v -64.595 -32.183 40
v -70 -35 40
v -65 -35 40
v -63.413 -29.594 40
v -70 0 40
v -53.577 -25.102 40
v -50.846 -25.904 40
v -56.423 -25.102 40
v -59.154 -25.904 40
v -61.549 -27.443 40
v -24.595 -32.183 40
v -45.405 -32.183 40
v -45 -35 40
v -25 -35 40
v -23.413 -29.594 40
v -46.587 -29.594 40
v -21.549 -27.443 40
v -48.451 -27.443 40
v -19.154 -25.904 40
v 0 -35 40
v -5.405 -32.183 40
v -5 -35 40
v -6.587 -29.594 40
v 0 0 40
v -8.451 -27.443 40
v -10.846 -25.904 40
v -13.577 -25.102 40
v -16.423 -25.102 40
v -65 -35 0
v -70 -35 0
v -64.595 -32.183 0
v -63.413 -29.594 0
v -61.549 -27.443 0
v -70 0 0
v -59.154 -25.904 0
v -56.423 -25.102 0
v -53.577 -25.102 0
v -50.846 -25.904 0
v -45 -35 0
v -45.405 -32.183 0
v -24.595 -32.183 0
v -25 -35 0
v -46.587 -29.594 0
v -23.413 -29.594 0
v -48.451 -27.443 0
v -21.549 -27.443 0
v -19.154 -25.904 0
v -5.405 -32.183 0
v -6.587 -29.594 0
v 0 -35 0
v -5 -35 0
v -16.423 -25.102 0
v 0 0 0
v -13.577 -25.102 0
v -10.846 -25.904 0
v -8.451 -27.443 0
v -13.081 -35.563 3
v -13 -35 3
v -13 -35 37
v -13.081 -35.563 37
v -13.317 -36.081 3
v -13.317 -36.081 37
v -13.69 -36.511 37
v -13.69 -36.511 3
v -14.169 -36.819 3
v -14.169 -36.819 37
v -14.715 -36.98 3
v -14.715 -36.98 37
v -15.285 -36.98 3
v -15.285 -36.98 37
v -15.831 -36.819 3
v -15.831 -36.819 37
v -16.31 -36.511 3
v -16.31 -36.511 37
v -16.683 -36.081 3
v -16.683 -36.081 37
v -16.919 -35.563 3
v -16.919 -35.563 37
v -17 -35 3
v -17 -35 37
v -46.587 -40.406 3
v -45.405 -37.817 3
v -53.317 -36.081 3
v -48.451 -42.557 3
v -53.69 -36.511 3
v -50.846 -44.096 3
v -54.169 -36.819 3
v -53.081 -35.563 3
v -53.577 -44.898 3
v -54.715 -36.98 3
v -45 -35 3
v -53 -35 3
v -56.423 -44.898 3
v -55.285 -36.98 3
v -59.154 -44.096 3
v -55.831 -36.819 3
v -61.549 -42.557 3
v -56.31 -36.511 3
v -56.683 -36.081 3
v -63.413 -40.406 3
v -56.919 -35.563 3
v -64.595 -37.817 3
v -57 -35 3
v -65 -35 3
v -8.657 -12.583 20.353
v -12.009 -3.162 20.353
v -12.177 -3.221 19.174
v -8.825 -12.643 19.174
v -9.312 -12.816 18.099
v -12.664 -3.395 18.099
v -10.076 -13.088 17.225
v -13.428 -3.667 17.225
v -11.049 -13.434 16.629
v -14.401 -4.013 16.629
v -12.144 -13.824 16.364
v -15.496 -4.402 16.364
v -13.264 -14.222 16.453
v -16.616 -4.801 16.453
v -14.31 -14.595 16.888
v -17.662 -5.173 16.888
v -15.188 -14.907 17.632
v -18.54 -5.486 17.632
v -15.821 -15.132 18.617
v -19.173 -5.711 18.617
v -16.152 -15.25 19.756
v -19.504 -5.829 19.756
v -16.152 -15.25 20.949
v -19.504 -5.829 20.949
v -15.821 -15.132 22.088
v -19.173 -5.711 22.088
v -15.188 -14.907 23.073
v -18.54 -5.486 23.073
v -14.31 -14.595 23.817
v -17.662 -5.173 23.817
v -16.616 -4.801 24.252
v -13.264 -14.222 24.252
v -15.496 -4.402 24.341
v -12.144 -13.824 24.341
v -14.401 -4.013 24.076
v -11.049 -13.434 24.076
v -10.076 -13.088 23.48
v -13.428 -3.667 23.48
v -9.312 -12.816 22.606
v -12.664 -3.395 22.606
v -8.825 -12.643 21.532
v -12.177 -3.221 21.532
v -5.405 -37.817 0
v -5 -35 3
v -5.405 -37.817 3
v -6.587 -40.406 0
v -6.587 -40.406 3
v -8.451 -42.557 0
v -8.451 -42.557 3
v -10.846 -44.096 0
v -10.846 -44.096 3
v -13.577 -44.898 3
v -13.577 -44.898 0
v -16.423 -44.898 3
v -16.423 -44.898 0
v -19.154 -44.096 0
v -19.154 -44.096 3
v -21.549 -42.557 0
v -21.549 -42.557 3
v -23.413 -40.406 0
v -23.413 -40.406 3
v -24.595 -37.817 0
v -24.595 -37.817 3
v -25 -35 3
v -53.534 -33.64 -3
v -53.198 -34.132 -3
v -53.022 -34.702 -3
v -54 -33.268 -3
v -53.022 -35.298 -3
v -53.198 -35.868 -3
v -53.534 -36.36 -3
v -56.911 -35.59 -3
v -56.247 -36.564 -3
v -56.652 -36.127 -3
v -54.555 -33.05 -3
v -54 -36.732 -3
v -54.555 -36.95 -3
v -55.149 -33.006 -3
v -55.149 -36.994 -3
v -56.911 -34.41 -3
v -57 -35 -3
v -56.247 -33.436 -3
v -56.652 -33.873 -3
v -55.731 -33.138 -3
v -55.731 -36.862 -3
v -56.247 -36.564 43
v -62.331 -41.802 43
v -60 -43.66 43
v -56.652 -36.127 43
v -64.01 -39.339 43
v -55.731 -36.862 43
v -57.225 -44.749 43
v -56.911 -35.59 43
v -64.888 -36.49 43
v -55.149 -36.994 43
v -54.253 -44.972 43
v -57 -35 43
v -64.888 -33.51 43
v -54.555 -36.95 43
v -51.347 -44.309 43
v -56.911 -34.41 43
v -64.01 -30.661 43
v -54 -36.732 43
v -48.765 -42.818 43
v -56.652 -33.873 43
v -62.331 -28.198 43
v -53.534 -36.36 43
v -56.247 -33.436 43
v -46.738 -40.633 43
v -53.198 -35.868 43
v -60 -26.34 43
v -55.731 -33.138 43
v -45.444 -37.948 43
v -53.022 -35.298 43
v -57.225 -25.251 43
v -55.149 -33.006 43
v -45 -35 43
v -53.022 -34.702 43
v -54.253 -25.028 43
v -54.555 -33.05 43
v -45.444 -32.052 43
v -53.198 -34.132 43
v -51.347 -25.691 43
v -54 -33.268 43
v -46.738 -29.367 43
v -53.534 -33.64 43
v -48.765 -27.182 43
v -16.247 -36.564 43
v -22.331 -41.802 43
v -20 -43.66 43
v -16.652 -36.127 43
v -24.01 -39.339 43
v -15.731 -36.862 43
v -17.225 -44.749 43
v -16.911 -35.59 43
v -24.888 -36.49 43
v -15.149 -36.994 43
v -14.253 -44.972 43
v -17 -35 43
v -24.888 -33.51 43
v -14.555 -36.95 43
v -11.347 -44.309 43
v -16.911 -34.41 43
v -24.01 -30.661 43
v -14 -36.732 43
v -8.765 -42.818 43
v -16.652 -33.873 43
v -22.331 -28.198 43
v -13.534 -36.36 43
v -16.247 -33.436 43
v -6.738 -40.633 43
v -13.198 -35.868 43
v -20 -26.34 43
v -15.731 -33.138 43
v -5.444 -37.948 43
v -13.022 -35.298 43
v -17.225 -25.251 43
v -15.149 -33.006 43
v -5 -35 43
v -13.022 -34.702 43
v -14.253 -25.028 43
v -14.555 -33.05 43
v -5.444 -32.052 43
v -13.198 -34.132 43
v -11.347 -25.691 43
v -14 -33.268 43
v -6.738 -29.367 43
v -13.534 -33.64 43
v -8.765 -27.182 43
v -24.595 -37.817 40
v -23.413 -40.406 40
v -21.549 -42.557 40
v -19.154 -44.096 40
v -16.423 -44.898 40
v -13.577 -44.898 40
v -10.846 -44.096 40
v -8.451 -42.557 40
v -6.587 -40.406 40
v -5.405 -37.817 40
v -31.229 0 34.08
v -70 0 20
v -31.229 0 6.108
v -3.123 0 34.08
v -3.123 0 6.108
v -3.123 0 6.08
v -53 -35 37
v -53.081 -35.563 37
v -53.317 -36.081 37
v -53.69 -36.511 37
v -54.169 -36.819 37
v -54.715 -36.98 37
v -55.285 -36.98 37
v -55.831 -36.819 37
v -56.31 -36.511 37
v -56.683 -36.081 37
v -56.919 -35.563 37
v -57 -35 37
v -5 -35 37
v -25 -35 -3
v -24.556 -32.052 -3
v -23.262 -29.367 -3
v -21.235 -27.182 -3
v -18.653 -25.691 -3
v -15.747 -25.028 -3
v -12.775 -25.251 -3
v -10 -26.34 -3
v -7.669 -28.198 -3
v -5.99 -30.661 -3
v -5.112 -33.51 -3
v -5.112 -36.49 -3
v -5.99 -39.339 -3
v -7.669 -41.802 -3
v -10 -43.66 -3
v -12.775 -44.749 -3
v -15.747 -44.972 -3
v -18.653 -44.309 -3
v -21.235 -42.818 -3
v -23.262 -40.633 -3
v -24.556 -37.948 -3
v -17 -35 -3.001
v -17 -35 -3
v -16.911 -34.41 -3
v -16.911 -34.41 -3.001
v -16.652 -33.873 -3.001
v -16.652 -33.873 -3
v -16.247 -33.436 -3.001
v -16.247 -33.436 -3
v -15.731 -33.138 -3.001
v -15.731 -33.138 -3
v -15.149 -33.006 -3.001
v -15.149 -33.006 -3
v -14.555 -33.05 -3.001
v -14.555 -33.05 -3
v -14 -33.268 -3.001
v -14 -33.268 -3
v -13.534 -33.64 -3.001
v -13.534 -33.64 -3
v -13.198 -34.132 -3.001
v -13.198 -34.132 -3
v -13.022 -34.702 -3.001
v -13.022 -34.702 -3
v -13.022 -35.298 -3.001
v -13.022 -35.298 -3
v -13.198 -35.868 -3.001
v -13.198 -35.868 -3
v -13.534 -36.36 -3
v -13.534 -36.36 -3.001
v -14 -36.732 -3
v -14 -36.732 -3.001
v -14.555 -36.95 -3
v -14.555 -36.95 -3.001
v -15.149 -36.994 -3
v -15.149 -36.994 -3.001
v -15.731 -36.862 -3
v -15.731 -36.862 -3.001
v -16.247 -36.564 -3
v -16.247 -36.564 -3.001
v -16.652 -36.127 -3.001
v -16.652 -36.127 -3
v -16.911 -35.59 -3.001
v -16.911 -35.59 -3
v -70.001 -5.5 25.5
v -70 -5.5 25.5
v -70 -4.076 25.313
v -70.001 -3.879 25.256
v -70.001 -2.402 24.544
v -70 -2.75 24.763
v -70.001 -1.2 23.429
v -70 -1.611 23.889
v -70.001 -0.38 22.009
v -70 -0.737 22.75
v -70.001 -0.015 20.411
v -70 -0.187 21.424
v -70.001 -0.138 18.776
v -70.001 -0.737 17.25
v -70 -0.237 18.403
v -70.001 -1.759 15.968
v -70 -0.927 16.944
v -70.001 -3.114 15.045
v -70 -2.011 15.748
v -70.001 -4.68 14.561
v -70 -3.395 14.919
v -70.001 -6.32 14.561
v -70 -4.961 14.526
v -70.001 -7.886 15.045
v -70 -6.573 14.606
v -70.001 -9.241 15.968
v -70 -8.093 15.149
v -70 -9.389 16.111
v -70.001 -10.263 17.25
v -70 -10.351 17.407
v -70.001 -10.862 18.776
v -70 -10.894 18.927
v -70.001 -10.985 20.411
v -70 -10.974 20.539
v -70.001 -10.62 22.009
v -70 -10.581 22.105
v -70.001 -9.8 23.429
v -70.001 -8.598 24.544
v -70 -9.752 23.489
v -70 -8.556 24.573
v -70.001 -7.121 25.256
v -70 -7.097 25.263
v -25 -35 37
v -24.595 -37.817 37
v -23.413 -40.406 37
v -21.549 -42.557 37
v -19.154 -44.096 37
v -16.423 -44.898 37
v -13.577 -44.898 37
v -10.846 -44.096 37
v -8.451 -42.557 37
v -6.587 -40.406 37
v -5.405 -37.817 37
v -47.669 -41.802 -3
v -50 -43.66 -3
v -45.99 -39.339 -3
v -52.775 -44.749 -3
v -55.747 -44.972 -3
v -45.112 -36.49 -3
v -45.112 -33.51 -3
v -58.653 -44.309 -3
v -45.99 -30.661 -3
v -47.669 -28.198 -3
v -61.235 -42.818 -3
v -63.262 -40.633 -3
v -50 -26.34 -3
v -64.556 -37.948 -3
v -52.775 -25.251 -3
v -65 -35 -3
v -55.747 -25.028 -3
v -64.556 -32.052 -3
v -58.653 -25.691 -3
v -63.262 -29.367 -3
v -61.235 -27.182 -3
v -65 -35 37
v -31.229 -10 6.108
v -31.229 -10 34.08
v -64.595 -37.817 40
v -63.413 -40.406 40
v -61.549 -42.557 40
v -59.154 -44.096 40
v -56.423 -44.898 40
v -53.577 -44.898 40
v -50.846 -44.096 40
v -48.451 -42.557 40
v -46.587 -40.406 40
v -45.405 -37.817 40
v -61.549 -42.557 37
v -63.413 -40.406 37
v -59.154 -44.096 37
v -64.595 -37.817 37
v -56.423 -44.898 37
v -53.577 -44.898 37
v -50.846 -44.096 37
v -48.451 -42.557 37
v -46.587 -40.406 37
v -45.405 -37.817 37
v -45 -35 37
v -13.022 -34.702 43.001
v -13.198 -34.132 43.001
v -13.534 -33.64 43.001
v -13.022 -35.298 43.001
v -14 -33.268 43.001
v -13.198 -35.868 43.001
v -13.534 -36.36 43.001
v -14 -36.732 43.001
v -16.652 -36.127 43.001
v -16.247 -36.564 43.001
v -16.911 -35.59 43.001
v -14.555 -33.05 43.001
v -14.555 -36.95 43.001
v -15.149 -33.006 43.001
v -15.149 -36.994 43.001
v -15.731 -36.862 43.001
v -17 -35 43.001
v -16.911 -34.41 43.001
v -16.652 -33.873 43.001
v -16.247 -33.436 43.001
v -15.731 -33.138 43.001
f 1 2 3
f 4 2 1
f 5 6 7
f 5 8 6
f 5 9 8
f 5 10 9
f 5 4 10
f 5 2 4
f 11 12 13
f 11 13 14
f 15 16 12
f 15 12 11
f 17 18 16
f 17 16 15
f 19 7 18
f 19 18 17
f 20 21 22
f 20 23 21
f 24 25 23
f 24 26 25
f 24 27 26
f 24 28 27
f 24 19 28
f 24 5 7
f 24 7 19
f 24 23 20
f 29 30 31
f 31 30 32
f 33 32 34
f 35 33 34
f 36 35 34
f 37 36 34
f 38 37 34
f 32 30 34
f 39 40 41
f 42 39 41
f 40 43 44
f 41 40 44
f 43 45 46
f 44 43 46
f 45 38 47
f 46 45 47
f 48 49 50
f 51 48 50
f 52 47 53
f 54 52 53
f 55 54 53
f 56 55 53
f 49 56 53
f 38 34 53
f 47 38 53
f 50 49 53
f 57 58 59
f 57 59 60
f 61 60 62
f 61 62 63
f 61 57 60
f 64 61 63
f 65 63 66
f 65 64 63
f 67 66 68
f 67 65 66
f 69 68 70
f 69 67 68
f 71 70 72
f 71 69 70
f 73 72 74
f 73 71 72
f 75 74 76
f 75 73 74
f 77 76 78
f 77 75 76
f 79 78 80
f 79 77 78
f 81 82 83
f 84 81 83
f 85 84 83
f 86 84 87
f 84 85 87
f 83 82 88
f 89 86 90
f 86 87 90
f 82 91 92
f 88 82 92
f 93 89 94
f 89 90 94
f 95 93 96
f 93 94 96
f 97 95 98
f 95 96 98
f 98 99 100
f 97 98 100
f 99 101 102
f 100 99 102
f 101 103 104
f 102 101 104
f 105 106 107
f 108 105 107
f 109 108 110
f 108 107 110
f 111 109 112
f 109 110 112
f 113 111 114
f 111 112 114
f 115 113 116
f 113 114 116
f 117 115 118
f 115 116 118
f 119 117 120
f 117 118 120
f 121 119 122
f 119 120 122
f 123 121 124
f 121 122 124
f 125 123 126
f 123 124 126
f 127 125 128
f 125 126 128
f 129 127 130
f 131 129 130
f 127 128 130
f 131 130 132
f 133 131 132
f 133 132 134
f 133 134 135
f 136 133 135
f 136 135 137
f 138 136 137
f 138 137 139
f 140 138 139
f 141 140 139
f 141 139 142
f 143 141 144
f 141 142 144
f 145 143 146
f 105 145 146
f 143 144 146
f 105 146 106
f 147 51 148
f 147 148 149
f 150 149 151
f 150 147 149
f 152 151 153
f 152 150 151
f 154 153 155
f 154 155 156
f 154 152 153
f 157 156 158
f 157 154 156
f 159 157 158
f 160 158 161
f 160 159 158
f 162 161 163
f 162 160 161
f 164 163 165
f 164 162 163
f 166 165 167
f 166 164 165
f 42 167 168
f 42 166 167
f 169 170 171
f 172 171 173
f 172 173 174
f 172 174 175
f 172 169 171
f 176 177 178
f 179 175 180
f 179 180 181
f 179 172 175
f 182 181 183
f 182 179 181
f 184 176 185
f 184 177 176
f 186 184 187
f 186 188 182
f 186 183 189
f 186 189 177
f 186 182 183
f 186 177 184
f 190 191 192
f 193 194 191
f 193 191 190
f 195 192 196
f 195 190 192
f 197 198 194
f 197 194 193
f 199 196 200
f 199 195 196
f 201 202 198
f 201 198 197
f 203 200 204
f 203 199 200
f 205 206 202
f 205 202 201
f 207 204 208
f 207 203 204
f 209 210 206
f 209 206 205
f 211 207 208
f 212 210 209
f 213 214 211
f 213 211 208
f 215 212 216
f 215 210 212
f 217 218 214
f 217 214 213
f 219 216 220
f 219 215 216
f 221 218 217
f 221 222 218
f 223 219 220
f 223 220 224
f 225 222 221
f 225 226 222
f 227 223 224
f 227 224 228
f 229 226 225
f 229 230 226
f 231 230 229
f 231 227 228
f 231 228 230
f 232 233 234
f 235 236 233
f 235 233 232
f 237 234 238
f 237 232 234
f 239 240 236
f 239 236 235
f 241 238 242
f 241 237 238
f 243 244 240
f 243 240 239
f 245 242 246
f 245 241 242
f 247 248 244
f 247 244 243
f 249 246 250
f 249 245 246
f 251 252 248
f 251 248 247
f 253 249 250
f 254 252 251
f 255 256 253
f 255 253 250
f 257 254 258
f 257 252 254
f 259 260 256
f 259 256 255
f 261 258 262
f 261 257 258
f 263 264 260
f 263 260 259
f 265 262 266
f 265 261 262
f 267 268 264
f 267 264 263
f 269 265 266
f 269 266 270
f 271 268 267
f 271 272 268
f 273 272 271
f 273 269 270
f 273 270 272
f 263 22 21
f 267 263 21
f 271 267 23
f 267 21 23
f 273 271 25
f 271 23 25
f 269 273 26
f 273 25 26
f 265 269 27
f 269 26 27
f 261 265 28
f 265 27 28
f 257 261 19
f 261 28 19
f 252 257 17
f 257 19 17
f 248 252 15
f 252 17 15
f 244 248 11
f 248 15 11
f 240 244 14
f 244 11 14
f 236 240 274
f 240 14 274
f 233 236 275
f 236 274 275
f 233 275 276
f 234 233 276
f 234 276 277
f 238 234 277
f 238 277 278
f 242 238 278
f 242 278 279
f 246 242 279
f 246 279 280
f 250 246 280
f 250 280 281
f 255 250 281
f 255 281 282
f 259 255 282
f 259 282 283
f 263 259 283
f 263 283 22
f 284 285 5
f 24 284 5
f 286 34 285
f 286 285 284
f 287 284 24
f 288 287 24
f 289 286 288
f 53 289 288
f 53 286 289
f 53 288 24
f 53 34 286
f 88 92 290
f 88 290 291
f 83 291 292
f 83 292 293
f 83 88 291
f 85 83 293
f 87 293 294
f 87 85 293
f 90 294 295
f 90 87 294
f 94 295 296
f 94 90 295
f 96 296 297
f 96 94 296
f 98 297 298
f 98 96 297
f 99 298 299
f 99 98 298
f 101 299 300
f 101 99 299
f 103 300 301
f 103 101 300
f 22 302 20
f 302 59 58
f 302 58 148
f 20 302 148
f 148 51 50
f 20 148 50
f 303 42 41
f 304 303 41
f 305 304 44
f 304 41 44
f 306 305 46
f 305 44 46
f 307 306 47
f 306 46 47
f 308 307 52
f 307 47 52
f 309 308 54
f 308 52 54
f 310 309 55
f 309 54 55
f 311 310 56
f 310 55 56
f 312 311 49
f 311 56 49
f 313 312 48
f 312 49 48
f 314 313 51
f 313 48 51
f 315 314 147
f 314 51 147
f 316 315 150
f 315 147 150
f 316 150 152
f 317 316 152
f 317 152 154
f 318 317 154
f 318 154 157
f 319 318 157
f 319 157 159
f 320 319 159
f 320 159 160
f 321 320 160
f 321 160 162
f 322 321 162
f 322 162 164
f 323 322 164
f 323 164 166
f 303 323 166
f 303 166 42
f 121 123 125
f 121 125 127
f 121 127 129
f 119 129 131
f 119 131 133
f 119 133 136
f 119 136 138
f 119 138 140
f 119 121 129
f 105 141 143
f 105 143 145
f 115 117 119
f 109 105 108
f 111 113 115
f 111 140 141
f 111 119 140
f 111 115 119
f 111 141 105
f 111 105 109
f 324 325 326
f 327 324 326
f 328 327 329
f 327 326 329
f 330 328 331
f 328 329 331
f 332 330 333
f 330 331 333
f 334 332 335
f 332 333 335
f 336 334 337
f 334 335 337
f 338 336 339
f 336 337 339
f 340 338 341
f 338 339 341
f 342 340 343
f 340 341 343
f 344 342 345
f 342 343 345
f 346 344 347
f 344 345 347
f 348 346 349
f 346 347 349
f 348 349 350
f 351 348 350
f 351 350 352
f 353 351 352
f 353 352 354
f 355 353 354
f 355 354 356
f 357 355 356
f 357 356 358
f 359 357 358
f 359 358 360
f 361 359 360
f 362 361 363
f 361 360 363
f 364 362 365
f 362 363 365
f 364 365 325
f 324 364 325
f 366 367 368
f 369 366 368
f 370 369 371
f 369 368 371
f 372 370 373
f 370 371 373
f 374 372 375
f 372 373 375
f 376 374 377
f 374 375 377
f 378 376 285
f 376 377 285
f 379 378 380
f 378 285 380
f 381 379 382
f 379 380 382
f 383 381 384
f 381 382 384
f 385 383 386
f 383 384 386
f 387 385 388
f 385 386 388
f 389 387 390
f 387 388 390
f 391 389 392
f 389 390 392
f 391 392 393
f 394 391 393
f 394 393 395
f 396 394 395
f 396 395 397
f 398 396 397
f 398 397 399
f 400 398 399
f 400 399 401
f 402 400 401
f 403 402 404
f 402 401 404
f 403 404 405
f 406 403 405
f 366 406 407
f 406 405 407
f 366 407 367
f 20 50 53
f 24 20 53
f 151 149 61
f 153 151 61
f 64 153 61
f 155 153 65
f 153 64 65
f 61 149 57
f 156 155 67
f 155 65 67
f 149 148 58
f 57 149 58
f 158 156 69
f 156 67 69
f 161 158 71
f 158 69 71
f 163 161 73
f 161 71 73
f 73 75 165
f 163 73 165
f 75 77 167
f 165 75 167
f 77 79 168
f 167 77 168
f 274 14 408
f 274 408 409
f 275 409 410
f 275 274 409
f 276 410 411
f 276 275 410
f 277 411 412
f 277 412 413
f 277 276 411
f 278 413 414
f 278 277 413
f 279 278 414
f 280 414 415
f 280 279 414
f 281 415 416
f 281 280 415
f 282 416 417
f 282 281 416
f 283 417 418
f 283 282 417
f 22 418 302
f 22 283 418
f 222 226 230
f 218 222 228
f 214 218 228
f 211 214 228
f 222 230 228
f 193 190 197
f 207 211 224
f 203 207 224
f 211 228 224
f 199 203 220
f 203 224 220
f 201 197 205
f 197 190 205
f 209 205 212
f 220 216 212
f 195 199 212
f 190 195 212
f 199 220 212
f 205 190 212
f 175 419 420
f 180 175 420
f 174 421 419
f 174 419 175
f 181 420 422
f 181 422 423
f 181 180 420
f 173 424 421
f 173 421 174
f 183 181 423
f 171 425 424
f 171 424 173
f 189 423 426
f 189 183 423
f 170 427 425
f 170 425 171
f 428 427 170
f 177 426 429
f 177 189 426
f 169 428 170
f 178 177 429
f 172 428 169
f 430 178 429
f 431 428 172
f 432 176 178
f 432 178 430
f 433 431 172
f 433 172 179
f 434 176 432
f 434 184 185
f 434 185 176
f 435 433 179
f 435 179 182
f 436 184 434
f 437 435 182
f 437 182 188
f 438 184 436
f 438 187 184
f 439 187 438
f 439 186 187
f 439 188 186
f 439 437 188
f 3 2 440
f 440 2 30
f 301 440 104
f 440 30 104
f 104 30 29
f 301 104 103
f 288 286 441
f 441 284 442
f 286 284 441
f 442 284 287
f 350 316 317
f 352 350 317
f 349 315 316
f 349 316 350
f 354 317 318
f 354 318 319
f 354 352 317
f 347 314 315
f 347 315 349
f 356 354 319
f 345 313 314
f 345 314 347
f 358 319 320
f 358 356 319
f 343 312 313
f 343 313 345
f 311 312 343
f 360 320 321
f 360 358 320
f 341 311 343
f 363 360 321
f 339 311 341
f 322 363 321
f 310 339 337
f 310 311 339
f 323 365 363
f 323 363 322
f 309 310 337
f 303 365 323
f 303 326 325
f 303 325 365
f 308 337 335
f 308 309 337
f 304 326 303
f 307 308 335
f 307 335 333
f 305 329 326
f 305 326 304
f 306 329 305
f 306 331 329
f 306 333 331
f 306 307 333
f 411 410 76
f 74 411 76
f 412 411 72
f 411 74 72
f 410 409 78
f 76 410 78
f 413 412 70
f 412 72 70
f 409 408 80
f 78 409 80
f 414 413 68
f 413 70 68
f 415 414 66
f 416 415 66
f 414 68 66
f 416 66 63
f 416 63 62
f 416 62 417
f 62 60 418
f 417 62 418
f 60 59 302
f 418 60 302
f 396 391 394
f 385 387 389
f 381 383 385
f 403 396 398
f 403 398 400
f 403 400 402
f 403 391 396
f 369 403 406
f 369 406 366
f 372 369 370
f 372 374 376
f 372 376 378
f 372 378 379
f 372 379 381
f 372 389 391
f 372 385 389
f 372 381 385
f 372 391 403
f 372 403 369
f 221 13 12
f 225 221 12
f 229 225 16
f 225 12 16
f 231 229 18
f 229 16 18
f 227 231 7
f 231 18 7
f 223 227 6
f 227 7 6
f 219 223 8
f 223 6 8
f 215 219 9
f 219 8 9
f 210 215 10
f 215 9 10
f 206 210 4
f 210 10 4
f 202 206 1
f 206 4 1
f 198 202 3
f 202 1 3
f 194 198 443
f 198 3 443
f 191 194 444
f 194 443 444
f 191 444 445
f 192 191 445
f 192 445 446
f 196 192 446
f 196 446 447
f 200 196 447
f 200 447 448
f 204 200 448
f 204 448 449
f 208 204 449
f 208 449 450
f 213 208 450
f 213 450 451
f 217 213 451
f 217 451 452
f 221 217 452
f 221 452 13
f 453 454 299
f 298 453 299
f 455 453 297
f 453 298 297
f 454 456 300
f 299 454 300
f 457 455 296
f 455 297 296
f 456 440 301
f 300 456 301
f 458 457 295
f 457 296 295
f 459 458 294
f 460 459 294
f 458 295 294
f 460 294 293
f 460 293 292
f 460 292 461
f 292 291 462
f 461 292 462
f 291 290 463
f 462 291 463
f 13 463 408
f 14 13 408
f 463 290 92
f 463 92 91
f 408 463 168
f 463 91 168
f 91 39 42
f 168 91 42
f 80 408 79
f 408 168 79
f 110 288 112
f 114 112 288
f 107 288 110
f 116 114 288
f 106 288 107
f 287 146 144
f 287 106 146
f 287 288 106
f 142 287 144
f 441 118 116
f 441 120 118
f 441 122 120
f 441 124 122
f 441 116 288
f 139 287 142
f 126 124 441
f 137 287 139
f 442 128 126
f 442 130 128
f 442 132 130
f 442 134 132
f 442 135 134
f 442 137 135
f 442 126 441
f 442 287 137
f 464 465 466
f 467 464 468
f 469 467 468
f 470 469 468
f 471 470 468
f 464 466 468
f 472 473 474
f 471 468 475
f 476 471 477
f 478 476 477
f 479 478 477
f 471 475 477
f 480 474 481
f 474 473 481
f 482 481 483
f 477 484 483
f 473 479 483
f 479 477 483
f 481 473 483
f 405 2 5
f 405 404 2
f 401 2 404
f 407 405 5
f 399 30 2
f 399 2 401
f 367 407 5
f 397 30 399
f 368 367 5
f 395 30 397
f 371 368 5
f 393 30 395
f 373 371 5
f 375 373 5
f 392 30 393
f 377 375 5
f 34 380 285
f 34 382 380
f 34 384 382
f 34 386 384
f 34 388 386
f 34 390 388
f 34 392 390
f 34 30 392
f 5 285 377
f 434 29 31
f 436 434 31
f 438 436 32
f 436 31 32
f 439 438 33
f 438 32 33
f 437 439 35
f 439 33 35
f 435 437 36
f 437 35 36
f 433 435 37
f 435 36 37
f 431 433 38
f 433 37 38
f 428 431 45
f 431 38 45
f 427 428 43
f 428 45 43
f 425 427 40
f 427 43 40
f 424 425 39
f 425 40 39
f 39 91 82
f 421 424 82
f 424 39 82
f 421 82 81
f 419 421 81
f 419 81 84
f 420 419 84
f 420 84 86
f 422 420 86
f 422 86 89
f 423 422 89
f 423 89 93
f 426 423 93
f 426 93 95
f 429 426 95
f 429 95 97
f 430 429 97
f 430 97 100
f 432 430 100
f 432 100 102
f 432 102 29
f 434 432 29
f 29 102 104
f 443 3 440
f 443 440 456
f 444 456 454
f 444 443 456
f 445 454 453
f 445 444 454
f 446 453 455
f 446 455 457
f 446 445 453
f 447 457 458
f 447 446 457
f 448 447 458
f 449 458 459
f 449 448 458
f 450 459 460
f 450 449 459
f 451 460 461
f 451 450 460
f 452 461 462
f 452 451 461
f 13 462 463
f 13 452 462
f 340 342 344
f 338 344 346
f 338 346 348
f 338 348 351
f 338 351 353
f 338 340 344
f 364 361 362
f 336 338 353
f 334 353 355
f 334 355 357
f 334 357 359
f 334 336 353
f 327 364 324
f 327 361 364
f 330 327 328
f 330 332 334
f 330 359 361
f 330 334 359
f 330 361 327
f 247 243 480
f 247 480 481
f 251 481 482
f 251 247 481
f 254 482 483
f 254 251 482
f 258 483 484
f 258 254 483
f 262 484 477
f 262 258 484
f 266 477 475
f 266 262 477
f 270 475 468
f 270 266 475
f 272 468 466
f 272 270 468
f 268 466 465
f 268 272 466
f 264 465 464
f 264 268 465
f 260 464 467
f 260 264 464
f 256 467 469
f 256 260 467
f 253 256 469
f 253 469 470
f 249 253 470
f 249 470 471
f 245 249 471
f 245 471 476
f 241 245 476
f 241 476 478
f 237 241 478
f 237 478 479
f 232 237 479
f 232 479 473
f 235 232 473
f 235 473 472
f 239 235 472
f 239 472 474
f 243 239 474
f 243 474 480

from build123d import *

# Parameters (mm, degrees)
SKETCH2_W                 = 70
SKETCH2_H                 = 35
BOSS_EXTRUDE2_DEPTH       = 40
SKETCH3_W                 = 28.105894453
SKETCH3_H                 = 27.971945797
CUT_EXTRUDE1_DEPTH        = 10
SKETCH4_R                 = 10
CUT_EXTRUDE2_DEPTH        = 3
SKETCH5_R                 = 10
CUT_EXTRUDE3_DEPTH        = 3
SKETCH6_R                 = 10
BOSS_EXTRUDE3_DEPTH       = 3
BOSS_EXTRUDE3_DEPTH_BACK  = 3
SKETCH7_R                 = 10
BOSS_EXTRUDE5_DEPTH       = 6
SKETCH8_R                 = 2
CUT_EXTRUDE5_DEPTH        = 46
SKETCH9_R                 = 2
BOSS_EXTRUDE8_DEPTH       = 0.0001
BOSS_EXTRUDE8_DEPTH_BACK  = 46.0001
SKETCH10_R                = 10
BOSS_EXTRUDE9_DEPTH       = 3
BOSS_EXTRUDE9_DEPTH_BACK  = 3
SKETCH11_R                = 10
BOSS_EXTRUDE10_DEPTH      = 3
BOSS_EXTRUDE10_DEPTH_BACK = 3
SKETCH12_R                = 2
CUT_EXTRUDE6_DEPTH        = 46
SKETCH13_R                = 2
BOSS_EXTRUDE11_DEPTH      = 0.001
BOSS_EXTRUDE11_DEPTH_BACK = 46.001
BOSS_EXTRUDE12_DEPTH      = 28
SKETCH18_R                = 4
CUT_EXTRUDE11_DEPTH       = 10
SKETCH19_R                = 5.5
BOSS_EXTRUDE13_DEPTH      = 0.001


with BuildPart() as part:
    # Sketch2 → Boss-Extrude2 (new body)
    with BuildSketch(Plane.XY):
        with Locations((-35, -17.5)):
            Rectangle(SKETCH2_W, SKETCH2_H)
    extrude(amount=BOSS_EXTRUDE2_DEPTH)

    # Sketch3 → Cut-Extrude1 (cut)
    with BuildSketch(Plane(origin=(0, 0, 0), x_dir=(1, 0, 0), z_dir=(0, 1, 0))):
        with Locations((-17.175677586, -20.094439992)):
            Rectangle(SKETCH3_W, SKETCH3_H)
    extrude(amount=-CUT_EXTRUDE1_DEPTH, mode=Mode.SUBTRACT)

    # Sketch4 → Cut-Extrude2 (cut)
    with BuildSketch(Plane.XY.offset(40)):
        with Locations((-15, -35)):
            Circle(SKETCH4_R)
        with Locations((-55, -35)):
            Circle(SKETCH4_R)
    extrude(amount=-CUT_EXTRUDE2_DEPTH, mode=Mode.SUBTRACT)

    # Sketch5 → Cut-Extrude3 (cut)
    with BuildSketch(Plane(origin=(0, 0, 0), x_dir=(-1, 0, 0), z_dir=(0, 0, -1))):
        with Locations((15, -35)):
            Circle(SKETCH5_R)
        with Locations((55, -35)):
            Circle(SKETCH5_R)
    extrude(amount=-CUT_EXTRUDE3_DEPTH, mode=Mode.SUBTRACT)

    # Sketch6 → Boss-Extrude3 (add, two sides)
    with BuildSketch(Plane.XY.offset(40)) as boss_extrude3_sk:
        with Locations((-55, -35)):
            Circle(SKETCH6_R)
    extrude(amount=BOSS_EXTRUDE3_DEPTH)
    extrude(boss_extrude3_sk.sketch, amount=-BOSS_EXTRUDE3_DEPTH_BACK)

    # Sketch7 → Boss-Extrude5 (add)
    with BuildSketch(Plane(origin=(0, 0, 3), x_dir=(-1, 0, 0), z_dir=(0, 0, -1))):
        with Locations((55, -35)):
            Circle(SKETCH7_R)
    extrude(amount=BOSS_EXTRUDE5_DEPTH)

    # Sketch8 → Cut-Extrude5 (cut)
    with BuildSketch(Plane(origin=(0, 0, -3), x_dir=(-1, 0, 0), z_dir=(0, 0, -1))):
        with Locations((55, -35)):
            Circle(SKETCH8_R)
    extrude(amount=-CUT_EXTRUDE5_DEPTH, mode=Mode.SUBTRACT)

    # Sketch9 → Boss-Extrude8 (add, two sides)
    with BuildSketch(Plane(origin=(0, 0, -3), x_dir=(-1, 0, 0), z_dir=(0, 0, -1))) as boss_extrude8_sk:
        with Locations((55, -35)):
            Circle(SKETCH9_R)
    extrude(amount=BOSS_EXTRUDE8_DEPTH)
    extrude(boss_extrude8_sk.sketch, amount=-BOSS_EXTRUDE8_DEPTH_BACK)

    # Sketch10 → Boss-Extrude9 (add, two sides)
    with BuildSketch(Plane.XY.offset(40)) as boss_extrude9_sk:
        with Locations((-15, -35)):
            Circle(SKETCH10_R)
    extrude(amount=BOSS_EXTRUDE9_DEPTH)
    extrude(boss_extrude9_sk.sketch, amount=-BOSS_EXTRUDE9_DEPTH_BACK)

    # Sketch11 → Boss-Extrude10 (add, two sides)
    with BuildSketch(Plane(origin=(0, 0, 0), x_dir=(-1, 0, 0), z_dir=(0, 0, -1))) as boss_extrude10_sk:
        with Locations((15, -35)):
            Circle(SKETCH11_R)
    extrude(amount=BOSS_EXTRUDE10_DEPTH)
    extrude(boss_extrude10_sk.sketch, amount=-BOSS_EXTRUDE10_DEPTH_BACK)

    # Sketch12 → Cut-Extrude6 (cut)
    with BuildSketch(Plane(origin=(0, 0, -3), x_dir=(-1, 0, 0), z_dir=(0, 0, -1))):
        with Locations((15, -35)):
            Circle(SKETCH12_R)
    extrude(amount=-CUT_EXTRUDE6_DEPTH, mode=Mode.SUBTRACT)

    # Sketch13 → Boss-Extrude11 (add, two sides)
    with BuildSketch(Plane(origin=(0, 0, -3), x_dir=(-1, 0, 0), z_dir=(0, 0, -1))) as boss_extrude11_sk:
        with Locations((15, -35)):
            Circle(SKETCH13_R)
    extrude(amount=BOSS_EXTRUDE11_DEPTH)
    extrude(boss_extrude11_sk.sketch, amount=-BOSS_EXTRUDE11_DEPTH_BACK)

    # Sketch14 → Boss-Extrude12 (add)
    with BuildSketch(Plane(origin=(0, 0, 34.080412891), x_dir=(-1, 0, 0), z_dir=(0, 0, -1))):
        Polygon((3.122730359, 0), (31.228624812, -10), (3.122730359, -10), align=None)
    extrude(amount=BOSS_EXTRUDE12_DEPTH)

    # Sketch18 → Cut-Extrude11 (cut)
    with BuildSketch(Plane(origin=(-0.350891722, 0.986212569, 0), x_dir=(0.942142791, 0.335211816, 0), z_dir=(-0.335211816, 0.942142791, 0))):
        with Locations((-16.374329601, -20.352535637)):
            Circle(SKETCH18_R)
    extrude(amount=-CUT_EXTRUDE11_DEPTH, mode=Mode.SUBTRACT)

    # Sketch19 → Boss-Extrude13 (add)
    with BuildSketch(Plane.ZY.offset(70)):
        with Locations((20, -5.5)):
            Circle(SKETCH19_R)
    extrude(amount=BOSS_EXTRUDE13_DEPTH)


solid = part.part
